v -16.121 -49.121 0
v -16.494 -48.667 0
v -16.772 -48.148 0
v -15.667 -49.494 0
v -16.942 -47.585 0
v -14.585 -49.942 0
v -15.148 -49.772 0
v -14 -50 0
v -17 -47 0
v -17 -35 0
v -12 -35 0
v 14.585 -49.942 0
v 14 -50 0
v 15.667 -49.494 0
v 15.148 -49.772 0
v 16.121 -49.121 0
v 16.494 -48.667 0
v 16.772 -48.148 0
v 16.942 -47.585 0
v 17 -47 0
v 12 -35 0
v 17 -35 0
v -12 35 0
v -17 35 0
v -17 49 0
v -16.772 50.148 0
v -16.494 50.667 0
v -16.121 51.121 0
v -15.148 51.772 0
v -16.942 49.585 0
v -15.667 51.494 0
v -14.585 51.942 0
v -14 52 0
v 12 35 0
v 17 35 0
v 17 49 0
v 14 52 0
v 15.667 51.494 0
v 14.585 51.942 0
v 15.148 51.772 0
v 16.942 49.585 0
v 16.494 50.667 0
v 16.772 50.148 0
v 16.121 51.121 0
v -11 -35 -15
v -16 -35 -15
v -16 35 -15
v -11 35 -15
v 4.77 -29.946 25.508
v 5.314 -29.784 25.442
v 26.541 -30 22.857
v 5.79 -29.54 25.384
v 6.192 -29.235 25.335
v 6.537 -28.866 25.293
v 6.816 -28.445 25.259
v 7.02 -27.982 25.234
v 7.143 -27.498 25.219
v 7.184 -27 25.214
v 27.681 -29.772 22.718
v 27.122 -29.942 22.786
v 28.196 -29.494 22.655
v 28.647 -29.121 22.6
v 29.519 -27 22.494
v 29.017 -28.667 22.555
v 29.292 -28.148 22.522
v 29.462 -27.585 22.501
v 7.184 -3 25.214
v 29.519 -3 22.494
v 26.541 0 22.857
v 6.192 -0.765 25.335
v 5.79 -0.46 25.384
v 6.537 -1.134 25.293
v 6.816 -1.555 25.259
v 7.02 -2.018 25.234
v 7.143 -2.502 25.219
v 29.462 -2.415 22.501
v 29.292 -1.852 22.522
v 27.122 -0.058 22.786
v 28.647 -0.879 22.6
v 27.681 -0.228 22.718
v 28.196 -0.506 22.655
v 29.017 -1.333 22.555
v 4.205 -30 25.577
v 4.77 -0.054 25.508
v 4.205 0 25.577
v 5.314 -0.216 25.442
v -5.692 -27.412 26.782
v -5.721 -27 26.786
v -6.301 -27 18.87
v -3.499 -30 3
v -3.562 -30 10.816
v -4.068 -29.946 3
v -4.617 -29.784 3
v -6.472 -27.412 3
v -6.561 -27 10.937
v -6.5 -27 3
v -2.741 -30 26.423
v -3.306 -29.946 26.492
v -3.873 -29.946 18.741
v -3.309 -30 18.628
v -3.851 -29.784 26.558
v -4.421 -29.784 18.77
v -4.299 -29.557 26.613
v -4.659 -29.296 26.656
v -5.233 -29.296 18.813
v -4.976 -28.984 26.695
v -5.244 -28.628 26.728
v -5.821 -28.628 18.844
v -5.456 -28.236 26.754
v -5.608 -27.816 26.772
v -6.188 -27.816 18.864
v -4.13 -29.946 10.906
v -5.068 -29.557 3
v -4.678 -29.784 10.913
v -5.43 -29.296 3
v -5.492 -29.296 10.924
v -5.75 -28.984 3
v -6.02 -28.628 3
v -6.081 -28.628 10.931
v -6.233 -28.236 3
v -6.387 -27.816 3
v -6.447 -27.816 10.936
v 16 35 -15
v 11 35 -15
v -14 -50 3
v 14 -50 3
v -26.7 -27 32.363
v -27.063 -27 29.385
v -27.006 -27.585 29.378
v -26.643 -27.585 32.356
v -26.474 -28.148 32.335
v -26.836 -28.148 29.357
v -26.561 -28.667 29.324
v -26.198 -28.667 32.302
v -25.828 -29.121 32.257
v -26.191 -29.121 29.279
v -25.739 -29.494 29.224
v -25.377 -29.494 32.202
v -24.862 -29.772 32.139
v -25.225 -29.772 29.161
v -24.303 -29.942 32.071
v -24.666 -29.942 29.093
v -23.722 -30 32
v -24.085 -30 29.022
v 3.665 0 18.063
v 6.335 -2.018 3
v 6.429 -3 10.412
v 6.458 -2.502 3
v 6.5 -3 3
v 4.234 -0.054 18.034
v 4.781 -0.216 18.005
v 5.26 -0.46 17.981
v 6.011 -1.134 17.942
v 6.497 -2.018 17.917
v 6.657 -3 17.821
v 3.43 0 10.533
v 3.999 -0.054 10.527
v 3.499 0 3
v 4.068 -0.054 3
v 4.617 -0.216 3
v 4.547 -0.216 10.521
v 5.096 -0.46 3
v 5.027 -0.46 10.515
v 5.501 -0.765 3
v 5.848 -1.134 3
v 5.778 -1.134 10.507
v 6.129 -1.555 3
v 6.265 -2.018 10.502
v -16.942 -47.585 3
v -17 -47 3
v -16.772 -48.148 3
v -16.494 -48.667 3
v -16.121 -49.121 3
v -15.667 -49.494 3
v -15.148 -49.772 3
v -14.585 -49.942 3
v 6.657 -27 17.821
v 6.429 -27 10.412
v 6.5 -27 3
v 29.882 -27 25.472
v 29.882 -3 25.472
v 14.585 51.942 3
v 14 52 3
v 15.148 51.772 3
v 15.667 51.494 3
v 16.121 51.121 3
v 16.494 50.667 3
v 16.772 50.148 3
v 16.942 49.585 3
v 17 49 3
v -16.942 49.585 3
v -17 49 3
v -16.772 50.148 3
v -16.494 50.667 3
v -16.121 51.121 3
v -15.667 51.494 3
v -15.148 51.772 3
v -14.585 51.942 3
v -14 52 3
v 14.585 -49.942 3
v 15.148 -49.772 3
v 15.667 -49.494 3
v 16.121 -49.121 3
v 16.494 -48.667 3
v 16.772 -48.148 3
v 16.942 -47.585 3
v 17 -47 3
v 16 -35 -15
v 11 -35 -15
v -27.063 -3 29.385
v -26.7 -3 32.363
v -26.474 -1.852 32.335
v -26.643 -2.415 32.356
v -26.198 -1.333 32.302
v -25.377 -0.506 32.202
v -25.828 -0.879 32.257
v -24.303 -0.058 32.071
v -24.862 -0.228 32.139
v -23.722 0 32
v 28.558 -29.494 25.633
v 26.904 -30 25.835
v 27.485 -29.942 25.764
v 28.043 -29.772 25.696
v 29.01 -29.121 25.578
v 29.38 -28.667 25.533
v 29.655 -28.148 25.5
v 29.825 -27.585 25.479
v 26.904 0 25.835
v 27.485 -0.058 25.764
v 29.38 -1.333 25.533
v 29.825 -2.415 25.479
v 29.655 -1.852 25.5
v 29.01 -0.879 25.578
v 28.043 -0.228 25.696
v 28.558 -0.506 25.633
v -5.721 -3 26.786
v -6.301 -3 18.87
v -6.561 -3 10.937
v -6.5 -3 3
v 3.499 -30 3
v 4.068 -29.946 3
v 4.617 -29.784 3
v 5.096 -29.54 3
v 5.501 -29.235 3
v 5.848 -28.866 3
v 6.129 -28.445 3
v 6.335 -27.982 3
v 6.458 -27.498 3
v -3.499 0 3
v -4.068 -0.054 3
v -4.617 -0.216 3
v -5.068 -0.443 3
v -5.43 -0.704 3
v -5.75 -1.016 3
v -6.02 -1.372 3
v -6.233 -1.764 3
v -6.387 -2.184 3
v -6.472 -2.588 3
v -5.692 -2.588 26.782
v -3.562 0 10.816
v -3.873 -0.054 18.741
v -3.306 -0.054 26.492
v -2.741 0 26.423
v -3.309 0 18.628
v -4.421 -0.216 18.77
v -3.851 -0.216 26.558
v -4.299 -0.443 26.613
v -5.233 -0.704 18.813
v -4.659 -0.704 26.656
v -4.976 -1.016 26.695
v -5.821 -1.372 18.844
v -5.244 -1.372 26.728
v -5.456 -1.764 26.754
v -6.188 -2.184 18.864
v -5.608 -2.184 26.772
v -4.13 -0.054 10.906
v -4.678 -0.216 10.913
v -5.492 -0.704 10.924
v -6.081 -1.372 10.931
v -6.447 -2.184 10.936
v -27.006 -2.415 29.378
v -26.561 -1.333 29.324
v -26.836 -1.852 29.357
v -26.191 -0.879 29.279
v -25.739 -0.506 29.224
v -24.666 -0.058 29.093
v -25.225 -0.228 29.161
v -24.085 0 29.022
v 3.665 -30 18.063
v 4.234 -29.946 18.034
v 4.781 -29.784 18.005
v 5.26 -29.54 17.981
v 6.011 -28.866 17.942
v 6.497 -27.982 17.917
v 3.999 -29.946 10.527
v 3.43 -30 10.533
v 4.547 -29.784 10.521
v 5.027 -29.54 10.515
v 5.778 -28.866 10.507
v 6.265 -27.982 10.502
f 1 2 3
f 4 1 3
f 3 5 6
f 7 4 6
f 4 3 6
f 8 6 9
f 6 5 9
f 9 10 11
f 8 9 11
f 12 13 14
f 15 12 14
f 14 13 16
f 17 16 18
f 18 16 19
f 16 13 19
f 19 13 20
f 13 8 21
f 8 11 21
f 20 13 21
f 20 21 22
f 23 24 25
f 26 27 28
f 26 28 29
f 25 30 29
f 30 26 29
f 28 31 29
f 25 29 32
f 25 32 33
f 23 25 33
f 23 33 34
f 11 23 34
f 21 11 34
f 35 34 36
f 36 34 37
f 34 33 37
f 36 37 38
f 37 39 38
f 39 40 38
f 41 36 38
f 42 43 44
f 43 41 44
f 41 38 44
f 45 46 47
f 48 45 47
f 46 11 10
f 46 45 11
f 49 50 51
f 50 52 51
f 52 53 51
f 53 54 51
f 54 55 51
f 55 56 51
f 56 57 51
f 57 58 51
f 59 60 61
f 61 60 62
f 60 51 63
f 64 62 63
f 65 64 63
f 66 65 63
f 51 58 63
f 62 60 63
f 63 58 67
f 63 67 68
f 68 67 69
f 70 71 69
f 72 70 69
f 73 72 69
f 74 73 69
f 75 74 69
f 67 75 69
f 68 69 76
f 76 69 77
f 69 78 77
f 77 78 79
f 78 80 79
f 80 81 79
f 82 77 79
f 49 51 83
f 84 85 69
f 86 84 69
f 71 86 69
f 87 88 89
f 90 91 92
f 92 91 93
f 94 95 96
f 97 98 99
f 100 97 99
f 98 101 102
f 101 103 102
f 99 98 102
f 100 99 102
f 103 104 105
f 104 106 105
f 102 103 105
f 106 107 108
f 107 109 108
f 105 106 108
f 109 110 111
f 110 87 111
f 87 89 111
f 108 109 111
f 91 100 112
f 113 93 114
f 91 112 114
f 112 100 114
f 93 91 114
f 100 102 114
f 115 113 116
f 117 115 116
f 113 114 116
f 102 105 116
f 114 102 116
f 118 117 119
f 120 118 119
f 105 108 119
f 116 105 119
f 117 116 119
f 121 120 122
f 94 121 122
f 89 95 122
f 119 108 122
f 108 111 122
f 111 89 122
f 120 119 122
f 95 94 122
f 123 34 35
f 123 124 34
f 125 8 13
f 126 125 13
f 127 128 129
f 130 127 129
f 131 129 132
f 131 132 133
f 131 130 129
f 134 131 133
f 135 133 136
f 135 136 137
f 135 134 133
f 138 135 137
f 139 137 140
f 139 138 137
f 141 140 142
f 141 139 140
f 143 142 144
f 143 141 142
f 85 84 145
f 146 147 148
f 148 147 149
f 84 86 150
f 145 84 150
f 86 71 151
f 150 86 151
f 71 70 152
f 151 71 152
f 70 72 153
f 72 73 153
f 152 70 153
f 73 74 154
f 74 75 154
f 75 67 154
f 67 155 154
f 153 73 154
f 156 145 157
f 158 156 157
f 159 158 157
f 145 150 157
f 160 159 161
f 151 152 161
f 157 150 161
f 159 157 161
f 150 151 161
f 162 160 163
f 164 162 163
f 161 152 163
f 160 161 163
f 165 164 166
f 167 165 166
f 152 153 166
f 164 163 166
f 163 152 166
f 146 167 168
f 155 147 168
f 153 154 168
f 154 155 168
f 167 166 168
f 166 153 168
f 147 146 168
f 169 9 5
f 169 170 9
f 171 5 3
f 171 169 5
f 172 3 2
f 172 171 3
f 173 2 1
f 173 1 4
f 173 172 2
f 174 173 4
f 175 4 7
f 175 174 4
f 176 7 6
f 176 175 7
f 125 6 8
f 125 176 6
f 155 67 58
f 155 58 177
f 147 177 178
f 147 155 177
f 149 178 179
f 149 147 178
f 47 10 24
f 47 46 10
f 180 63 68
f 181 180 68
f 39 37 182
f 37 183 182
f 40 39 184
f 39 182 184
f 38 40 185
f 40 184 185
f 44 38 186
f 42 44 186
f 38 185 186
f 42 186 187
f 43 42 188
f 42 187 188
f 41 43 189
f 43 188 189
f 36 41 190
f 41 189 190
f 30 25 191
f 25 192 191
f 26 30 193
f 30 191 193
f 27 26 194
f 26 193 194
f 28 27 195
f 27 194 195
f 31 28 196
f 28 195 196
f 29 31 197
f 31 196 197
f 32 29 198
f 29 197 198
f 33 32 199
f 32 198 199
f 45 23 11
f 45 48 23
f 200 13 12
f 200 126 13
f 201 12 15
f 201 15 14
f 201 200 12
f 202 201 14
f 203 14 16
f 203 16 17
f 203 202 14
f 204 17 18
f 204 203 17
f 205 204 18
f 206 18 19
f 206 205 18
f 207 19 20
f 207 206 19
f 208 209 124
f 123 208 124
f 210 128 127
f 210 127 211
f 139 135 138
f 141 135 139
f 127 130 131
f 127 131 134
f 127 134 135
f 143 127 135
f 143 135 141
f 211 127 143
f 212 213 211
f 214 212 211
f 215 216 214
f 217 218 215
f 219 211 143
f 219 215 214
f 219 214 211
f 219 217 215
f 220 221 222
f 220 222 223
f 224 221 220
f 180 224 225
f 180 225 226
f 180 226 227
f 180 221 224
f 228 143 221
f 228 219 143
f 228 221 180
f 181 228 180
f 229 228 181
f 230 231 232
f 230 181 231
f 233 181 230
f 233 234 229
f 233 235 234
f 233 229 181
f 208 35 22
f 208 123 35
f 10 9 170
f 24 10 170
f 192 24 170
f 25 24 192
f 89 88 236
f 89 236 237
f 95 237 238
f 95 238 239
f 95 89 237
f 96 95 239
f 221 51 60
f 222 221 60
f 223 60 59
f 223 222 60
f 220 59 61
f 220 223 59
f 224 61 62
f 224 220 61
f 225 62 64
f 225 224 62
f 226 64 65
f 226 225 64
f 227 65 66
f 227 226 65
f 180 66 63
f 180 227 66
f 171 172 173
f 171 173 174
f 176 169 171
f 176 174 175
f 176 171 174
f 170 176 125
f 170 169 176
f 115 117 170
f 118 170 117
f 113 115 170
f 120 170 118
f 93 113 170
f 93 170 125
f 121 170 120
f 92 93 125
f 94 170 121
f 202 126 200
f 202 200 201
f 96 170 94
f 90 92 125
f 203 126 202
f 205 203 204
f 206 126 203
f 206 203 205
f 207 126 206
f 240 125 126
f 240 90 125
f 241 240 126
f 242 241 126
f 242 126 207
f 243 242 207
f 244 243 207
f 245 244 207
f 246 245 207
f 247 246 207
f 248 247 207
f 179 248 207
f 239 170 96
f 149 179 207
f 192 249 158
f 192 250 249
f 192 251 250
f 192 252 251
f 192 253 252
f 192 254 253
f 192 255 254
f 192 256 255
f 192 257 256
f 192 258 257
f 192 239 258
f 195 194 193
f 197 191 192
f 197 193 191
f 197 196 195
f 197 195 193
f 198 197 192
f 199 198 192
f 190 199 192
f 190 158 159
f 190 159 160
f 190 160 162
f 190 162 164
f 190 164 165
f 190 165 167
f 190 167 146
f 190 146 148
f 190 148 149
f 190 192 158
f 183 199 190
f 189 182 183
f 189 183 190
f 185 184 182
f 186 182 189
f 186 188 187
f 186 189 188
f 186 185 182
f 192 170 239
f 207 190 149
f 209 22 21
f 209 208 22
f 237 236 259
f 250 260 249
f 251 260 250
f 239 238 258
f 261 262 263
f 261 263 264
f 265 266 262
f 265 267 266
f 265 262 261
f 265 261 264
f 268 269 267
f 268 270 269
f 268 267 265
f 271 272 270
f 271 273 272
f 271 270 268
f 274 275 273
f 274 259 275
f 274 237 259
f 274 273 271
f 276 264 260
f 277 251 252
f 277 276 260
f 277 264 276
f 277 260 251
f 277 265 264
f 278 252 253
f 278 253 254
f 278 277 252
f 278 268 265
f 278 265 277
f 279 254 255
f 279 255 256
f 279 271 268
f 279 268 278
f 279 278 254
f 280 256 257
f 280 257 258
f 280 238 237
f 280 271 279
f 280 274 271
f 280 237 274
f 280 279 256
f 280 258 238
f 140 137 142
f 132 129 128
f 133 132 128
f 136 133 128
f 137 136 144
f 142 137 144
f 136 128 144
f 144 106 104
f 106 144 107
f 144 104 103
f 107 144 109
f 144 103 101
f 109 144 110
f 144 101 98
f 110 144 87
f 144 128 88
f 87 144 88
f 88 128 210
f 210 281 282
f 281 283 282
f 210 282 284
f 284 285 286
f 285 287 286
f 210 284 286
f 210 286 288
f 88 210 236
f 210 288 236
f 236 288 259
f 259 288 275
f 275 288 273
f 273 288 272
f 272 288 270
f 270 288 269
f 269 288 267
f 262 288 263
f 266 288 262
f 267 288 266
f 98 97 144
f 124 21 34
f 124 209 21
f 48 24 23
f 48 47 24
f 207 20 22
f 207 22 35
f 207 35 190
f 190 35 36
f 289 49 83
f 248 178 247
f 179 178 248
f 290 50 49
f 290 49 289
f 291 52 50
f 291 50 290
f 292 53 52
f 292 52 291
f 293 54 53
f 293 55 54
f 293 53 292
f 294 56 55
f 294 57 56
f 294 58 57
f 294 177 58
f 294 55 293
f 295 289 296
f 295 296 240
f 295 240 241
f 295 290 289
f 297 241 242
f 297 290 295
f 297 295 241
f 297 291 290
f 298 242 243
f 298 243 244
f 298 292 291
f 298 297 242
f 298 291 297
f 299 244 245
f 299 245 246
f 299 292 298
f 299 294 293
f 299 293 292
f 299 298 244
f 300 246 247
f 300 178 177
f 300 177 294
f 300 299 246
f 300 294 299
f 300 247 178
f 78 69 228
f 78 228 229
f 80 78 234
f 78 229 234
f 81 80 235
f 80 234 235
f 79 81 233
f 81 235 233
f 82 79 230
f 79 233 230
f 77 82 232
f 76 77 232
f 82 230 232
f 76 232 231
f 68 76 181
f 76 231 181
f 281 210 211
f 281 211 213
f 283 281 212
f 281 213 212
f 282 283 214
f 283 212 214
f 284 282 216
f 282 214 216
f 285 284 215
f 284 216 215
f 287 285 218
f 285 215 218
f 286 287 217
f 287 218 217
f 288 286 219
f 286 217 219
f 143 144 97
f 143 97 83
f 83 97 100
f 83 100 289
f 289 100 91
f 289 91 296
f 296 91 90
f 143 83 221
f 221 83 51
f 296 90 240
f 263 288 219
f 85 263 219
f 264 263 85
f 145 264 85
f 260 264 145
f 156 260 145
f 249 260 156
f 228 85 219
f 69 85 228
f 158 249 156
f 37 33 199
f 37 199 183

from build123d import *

# Parameters (mm, degrees)
F0_W     = 34
F0_H     = 102
F1_DEPTH = 3
F6_W     = 57
F6_H     = 30
F7_DEPTH = 3
F8_R     = 3
F2_W     = 5
F2_H     = 70
F10_W    = 5
F10_H    = 70
F13_R    = 3


# Not quite as in the source:
# - a feature names something its author has since deleted; it is built from what else it names


with BuildPart() as f1:
    # F0 (on Top) → F1 (new body)
    with BuildSketch(Plane.XY):
        with Locations((0, 1)):
            Rectangle(F0_W, F0_H)
    extrude(amount=F1_DEPTH)

    # F5: sweep along a path in F4
    with BuildLine(Plane.XZ) as f5_path:
        ThreePointArc((0.7317709574, 26), (0.0173632461, 14.5110886282), (0, 3))
    # F3 (on face) → F5 (sweep)
    with BuildSketch(Plane.XY.offset(3)):
        Polygon((6.5, 0), (0, 0), (-6.5, 0), (-6.5, -30), (0, -30), (6.5, -30), align=None)
    sweep(path=f5_path.line)

    # F6 (on face) → F7 (join)
    with BuildSketch(Plane(origin=(3.1308235326, 0, 25.7078318269), x_dir=(0.9926657135, 0, -0.1208916099), z_dir=(0.1208916099, 0, 0.9926657135))):
        with Locations((-1.916777917, -15)):
            Rectangle(F6_W, F6_H)
    extrude(amount=F7_DEPTH)

    # F8
    f8_edges = [f1.edges().sort_by_distance(p)[0] for p in [
        (29.700414, -30, 23.983142),
        (29.700414, 0, 23.983142),
        (-26.881532, -30, 30.873964),
        (-26.881532, 0, 30.873964),
    ]]
    fillet(f8_edges, radius=F8_R)

    # F2 (on face) → F11 section 0
    with BuildSketch(Plane(origin=(0, 0, 0), x_dir=(1, 0, 0), z_dir=(0, 0, -1))):
        with Locations((14.5, 0)):
            Rectangle(F2_W, F2_H)
    # F10 (on offset) → F11 section 1
    with BuildSketch(Plane.XY.offset(-15)):
        with Locations((13.5, 0)):
            Rectangle(F10_W, F10_H)
    loft()

    # F2 (on face) → F12 section 0
    with BuildSketch(Plane(origin=(0, 0, 0), x_dir=(1, 0, 0), z_dir=(0, 0, -1))):
        with Locations((-14.5, 0)):
            Rectangle(F2_W, F2_H)
    # F10 (on offset) → F12 section 1
    with BuildSketch(Plane.XY.offset(-15)):
        with Locations((-13.5, 0)):
            Rectangle(F10_W, F10_H)
    loft()

    # F13
    f13_edges = [f1.edges().sort_by_distance(p)[0] for p in [
        (17, -50, 1.5),
        (-17, -50, 1.5),
        (17, 52, 1.5),
        (-17, 52, 1.5),
        (6.505434, -30, 14.117469),
        (-6.470708, -30, 14.904709),
        (6.505434, 0, 14.117469),
        (-6.470708, 0, 14.904709),
    ]]
    fillet(f13_edges, radius=F13_R)


solid = f1.part
